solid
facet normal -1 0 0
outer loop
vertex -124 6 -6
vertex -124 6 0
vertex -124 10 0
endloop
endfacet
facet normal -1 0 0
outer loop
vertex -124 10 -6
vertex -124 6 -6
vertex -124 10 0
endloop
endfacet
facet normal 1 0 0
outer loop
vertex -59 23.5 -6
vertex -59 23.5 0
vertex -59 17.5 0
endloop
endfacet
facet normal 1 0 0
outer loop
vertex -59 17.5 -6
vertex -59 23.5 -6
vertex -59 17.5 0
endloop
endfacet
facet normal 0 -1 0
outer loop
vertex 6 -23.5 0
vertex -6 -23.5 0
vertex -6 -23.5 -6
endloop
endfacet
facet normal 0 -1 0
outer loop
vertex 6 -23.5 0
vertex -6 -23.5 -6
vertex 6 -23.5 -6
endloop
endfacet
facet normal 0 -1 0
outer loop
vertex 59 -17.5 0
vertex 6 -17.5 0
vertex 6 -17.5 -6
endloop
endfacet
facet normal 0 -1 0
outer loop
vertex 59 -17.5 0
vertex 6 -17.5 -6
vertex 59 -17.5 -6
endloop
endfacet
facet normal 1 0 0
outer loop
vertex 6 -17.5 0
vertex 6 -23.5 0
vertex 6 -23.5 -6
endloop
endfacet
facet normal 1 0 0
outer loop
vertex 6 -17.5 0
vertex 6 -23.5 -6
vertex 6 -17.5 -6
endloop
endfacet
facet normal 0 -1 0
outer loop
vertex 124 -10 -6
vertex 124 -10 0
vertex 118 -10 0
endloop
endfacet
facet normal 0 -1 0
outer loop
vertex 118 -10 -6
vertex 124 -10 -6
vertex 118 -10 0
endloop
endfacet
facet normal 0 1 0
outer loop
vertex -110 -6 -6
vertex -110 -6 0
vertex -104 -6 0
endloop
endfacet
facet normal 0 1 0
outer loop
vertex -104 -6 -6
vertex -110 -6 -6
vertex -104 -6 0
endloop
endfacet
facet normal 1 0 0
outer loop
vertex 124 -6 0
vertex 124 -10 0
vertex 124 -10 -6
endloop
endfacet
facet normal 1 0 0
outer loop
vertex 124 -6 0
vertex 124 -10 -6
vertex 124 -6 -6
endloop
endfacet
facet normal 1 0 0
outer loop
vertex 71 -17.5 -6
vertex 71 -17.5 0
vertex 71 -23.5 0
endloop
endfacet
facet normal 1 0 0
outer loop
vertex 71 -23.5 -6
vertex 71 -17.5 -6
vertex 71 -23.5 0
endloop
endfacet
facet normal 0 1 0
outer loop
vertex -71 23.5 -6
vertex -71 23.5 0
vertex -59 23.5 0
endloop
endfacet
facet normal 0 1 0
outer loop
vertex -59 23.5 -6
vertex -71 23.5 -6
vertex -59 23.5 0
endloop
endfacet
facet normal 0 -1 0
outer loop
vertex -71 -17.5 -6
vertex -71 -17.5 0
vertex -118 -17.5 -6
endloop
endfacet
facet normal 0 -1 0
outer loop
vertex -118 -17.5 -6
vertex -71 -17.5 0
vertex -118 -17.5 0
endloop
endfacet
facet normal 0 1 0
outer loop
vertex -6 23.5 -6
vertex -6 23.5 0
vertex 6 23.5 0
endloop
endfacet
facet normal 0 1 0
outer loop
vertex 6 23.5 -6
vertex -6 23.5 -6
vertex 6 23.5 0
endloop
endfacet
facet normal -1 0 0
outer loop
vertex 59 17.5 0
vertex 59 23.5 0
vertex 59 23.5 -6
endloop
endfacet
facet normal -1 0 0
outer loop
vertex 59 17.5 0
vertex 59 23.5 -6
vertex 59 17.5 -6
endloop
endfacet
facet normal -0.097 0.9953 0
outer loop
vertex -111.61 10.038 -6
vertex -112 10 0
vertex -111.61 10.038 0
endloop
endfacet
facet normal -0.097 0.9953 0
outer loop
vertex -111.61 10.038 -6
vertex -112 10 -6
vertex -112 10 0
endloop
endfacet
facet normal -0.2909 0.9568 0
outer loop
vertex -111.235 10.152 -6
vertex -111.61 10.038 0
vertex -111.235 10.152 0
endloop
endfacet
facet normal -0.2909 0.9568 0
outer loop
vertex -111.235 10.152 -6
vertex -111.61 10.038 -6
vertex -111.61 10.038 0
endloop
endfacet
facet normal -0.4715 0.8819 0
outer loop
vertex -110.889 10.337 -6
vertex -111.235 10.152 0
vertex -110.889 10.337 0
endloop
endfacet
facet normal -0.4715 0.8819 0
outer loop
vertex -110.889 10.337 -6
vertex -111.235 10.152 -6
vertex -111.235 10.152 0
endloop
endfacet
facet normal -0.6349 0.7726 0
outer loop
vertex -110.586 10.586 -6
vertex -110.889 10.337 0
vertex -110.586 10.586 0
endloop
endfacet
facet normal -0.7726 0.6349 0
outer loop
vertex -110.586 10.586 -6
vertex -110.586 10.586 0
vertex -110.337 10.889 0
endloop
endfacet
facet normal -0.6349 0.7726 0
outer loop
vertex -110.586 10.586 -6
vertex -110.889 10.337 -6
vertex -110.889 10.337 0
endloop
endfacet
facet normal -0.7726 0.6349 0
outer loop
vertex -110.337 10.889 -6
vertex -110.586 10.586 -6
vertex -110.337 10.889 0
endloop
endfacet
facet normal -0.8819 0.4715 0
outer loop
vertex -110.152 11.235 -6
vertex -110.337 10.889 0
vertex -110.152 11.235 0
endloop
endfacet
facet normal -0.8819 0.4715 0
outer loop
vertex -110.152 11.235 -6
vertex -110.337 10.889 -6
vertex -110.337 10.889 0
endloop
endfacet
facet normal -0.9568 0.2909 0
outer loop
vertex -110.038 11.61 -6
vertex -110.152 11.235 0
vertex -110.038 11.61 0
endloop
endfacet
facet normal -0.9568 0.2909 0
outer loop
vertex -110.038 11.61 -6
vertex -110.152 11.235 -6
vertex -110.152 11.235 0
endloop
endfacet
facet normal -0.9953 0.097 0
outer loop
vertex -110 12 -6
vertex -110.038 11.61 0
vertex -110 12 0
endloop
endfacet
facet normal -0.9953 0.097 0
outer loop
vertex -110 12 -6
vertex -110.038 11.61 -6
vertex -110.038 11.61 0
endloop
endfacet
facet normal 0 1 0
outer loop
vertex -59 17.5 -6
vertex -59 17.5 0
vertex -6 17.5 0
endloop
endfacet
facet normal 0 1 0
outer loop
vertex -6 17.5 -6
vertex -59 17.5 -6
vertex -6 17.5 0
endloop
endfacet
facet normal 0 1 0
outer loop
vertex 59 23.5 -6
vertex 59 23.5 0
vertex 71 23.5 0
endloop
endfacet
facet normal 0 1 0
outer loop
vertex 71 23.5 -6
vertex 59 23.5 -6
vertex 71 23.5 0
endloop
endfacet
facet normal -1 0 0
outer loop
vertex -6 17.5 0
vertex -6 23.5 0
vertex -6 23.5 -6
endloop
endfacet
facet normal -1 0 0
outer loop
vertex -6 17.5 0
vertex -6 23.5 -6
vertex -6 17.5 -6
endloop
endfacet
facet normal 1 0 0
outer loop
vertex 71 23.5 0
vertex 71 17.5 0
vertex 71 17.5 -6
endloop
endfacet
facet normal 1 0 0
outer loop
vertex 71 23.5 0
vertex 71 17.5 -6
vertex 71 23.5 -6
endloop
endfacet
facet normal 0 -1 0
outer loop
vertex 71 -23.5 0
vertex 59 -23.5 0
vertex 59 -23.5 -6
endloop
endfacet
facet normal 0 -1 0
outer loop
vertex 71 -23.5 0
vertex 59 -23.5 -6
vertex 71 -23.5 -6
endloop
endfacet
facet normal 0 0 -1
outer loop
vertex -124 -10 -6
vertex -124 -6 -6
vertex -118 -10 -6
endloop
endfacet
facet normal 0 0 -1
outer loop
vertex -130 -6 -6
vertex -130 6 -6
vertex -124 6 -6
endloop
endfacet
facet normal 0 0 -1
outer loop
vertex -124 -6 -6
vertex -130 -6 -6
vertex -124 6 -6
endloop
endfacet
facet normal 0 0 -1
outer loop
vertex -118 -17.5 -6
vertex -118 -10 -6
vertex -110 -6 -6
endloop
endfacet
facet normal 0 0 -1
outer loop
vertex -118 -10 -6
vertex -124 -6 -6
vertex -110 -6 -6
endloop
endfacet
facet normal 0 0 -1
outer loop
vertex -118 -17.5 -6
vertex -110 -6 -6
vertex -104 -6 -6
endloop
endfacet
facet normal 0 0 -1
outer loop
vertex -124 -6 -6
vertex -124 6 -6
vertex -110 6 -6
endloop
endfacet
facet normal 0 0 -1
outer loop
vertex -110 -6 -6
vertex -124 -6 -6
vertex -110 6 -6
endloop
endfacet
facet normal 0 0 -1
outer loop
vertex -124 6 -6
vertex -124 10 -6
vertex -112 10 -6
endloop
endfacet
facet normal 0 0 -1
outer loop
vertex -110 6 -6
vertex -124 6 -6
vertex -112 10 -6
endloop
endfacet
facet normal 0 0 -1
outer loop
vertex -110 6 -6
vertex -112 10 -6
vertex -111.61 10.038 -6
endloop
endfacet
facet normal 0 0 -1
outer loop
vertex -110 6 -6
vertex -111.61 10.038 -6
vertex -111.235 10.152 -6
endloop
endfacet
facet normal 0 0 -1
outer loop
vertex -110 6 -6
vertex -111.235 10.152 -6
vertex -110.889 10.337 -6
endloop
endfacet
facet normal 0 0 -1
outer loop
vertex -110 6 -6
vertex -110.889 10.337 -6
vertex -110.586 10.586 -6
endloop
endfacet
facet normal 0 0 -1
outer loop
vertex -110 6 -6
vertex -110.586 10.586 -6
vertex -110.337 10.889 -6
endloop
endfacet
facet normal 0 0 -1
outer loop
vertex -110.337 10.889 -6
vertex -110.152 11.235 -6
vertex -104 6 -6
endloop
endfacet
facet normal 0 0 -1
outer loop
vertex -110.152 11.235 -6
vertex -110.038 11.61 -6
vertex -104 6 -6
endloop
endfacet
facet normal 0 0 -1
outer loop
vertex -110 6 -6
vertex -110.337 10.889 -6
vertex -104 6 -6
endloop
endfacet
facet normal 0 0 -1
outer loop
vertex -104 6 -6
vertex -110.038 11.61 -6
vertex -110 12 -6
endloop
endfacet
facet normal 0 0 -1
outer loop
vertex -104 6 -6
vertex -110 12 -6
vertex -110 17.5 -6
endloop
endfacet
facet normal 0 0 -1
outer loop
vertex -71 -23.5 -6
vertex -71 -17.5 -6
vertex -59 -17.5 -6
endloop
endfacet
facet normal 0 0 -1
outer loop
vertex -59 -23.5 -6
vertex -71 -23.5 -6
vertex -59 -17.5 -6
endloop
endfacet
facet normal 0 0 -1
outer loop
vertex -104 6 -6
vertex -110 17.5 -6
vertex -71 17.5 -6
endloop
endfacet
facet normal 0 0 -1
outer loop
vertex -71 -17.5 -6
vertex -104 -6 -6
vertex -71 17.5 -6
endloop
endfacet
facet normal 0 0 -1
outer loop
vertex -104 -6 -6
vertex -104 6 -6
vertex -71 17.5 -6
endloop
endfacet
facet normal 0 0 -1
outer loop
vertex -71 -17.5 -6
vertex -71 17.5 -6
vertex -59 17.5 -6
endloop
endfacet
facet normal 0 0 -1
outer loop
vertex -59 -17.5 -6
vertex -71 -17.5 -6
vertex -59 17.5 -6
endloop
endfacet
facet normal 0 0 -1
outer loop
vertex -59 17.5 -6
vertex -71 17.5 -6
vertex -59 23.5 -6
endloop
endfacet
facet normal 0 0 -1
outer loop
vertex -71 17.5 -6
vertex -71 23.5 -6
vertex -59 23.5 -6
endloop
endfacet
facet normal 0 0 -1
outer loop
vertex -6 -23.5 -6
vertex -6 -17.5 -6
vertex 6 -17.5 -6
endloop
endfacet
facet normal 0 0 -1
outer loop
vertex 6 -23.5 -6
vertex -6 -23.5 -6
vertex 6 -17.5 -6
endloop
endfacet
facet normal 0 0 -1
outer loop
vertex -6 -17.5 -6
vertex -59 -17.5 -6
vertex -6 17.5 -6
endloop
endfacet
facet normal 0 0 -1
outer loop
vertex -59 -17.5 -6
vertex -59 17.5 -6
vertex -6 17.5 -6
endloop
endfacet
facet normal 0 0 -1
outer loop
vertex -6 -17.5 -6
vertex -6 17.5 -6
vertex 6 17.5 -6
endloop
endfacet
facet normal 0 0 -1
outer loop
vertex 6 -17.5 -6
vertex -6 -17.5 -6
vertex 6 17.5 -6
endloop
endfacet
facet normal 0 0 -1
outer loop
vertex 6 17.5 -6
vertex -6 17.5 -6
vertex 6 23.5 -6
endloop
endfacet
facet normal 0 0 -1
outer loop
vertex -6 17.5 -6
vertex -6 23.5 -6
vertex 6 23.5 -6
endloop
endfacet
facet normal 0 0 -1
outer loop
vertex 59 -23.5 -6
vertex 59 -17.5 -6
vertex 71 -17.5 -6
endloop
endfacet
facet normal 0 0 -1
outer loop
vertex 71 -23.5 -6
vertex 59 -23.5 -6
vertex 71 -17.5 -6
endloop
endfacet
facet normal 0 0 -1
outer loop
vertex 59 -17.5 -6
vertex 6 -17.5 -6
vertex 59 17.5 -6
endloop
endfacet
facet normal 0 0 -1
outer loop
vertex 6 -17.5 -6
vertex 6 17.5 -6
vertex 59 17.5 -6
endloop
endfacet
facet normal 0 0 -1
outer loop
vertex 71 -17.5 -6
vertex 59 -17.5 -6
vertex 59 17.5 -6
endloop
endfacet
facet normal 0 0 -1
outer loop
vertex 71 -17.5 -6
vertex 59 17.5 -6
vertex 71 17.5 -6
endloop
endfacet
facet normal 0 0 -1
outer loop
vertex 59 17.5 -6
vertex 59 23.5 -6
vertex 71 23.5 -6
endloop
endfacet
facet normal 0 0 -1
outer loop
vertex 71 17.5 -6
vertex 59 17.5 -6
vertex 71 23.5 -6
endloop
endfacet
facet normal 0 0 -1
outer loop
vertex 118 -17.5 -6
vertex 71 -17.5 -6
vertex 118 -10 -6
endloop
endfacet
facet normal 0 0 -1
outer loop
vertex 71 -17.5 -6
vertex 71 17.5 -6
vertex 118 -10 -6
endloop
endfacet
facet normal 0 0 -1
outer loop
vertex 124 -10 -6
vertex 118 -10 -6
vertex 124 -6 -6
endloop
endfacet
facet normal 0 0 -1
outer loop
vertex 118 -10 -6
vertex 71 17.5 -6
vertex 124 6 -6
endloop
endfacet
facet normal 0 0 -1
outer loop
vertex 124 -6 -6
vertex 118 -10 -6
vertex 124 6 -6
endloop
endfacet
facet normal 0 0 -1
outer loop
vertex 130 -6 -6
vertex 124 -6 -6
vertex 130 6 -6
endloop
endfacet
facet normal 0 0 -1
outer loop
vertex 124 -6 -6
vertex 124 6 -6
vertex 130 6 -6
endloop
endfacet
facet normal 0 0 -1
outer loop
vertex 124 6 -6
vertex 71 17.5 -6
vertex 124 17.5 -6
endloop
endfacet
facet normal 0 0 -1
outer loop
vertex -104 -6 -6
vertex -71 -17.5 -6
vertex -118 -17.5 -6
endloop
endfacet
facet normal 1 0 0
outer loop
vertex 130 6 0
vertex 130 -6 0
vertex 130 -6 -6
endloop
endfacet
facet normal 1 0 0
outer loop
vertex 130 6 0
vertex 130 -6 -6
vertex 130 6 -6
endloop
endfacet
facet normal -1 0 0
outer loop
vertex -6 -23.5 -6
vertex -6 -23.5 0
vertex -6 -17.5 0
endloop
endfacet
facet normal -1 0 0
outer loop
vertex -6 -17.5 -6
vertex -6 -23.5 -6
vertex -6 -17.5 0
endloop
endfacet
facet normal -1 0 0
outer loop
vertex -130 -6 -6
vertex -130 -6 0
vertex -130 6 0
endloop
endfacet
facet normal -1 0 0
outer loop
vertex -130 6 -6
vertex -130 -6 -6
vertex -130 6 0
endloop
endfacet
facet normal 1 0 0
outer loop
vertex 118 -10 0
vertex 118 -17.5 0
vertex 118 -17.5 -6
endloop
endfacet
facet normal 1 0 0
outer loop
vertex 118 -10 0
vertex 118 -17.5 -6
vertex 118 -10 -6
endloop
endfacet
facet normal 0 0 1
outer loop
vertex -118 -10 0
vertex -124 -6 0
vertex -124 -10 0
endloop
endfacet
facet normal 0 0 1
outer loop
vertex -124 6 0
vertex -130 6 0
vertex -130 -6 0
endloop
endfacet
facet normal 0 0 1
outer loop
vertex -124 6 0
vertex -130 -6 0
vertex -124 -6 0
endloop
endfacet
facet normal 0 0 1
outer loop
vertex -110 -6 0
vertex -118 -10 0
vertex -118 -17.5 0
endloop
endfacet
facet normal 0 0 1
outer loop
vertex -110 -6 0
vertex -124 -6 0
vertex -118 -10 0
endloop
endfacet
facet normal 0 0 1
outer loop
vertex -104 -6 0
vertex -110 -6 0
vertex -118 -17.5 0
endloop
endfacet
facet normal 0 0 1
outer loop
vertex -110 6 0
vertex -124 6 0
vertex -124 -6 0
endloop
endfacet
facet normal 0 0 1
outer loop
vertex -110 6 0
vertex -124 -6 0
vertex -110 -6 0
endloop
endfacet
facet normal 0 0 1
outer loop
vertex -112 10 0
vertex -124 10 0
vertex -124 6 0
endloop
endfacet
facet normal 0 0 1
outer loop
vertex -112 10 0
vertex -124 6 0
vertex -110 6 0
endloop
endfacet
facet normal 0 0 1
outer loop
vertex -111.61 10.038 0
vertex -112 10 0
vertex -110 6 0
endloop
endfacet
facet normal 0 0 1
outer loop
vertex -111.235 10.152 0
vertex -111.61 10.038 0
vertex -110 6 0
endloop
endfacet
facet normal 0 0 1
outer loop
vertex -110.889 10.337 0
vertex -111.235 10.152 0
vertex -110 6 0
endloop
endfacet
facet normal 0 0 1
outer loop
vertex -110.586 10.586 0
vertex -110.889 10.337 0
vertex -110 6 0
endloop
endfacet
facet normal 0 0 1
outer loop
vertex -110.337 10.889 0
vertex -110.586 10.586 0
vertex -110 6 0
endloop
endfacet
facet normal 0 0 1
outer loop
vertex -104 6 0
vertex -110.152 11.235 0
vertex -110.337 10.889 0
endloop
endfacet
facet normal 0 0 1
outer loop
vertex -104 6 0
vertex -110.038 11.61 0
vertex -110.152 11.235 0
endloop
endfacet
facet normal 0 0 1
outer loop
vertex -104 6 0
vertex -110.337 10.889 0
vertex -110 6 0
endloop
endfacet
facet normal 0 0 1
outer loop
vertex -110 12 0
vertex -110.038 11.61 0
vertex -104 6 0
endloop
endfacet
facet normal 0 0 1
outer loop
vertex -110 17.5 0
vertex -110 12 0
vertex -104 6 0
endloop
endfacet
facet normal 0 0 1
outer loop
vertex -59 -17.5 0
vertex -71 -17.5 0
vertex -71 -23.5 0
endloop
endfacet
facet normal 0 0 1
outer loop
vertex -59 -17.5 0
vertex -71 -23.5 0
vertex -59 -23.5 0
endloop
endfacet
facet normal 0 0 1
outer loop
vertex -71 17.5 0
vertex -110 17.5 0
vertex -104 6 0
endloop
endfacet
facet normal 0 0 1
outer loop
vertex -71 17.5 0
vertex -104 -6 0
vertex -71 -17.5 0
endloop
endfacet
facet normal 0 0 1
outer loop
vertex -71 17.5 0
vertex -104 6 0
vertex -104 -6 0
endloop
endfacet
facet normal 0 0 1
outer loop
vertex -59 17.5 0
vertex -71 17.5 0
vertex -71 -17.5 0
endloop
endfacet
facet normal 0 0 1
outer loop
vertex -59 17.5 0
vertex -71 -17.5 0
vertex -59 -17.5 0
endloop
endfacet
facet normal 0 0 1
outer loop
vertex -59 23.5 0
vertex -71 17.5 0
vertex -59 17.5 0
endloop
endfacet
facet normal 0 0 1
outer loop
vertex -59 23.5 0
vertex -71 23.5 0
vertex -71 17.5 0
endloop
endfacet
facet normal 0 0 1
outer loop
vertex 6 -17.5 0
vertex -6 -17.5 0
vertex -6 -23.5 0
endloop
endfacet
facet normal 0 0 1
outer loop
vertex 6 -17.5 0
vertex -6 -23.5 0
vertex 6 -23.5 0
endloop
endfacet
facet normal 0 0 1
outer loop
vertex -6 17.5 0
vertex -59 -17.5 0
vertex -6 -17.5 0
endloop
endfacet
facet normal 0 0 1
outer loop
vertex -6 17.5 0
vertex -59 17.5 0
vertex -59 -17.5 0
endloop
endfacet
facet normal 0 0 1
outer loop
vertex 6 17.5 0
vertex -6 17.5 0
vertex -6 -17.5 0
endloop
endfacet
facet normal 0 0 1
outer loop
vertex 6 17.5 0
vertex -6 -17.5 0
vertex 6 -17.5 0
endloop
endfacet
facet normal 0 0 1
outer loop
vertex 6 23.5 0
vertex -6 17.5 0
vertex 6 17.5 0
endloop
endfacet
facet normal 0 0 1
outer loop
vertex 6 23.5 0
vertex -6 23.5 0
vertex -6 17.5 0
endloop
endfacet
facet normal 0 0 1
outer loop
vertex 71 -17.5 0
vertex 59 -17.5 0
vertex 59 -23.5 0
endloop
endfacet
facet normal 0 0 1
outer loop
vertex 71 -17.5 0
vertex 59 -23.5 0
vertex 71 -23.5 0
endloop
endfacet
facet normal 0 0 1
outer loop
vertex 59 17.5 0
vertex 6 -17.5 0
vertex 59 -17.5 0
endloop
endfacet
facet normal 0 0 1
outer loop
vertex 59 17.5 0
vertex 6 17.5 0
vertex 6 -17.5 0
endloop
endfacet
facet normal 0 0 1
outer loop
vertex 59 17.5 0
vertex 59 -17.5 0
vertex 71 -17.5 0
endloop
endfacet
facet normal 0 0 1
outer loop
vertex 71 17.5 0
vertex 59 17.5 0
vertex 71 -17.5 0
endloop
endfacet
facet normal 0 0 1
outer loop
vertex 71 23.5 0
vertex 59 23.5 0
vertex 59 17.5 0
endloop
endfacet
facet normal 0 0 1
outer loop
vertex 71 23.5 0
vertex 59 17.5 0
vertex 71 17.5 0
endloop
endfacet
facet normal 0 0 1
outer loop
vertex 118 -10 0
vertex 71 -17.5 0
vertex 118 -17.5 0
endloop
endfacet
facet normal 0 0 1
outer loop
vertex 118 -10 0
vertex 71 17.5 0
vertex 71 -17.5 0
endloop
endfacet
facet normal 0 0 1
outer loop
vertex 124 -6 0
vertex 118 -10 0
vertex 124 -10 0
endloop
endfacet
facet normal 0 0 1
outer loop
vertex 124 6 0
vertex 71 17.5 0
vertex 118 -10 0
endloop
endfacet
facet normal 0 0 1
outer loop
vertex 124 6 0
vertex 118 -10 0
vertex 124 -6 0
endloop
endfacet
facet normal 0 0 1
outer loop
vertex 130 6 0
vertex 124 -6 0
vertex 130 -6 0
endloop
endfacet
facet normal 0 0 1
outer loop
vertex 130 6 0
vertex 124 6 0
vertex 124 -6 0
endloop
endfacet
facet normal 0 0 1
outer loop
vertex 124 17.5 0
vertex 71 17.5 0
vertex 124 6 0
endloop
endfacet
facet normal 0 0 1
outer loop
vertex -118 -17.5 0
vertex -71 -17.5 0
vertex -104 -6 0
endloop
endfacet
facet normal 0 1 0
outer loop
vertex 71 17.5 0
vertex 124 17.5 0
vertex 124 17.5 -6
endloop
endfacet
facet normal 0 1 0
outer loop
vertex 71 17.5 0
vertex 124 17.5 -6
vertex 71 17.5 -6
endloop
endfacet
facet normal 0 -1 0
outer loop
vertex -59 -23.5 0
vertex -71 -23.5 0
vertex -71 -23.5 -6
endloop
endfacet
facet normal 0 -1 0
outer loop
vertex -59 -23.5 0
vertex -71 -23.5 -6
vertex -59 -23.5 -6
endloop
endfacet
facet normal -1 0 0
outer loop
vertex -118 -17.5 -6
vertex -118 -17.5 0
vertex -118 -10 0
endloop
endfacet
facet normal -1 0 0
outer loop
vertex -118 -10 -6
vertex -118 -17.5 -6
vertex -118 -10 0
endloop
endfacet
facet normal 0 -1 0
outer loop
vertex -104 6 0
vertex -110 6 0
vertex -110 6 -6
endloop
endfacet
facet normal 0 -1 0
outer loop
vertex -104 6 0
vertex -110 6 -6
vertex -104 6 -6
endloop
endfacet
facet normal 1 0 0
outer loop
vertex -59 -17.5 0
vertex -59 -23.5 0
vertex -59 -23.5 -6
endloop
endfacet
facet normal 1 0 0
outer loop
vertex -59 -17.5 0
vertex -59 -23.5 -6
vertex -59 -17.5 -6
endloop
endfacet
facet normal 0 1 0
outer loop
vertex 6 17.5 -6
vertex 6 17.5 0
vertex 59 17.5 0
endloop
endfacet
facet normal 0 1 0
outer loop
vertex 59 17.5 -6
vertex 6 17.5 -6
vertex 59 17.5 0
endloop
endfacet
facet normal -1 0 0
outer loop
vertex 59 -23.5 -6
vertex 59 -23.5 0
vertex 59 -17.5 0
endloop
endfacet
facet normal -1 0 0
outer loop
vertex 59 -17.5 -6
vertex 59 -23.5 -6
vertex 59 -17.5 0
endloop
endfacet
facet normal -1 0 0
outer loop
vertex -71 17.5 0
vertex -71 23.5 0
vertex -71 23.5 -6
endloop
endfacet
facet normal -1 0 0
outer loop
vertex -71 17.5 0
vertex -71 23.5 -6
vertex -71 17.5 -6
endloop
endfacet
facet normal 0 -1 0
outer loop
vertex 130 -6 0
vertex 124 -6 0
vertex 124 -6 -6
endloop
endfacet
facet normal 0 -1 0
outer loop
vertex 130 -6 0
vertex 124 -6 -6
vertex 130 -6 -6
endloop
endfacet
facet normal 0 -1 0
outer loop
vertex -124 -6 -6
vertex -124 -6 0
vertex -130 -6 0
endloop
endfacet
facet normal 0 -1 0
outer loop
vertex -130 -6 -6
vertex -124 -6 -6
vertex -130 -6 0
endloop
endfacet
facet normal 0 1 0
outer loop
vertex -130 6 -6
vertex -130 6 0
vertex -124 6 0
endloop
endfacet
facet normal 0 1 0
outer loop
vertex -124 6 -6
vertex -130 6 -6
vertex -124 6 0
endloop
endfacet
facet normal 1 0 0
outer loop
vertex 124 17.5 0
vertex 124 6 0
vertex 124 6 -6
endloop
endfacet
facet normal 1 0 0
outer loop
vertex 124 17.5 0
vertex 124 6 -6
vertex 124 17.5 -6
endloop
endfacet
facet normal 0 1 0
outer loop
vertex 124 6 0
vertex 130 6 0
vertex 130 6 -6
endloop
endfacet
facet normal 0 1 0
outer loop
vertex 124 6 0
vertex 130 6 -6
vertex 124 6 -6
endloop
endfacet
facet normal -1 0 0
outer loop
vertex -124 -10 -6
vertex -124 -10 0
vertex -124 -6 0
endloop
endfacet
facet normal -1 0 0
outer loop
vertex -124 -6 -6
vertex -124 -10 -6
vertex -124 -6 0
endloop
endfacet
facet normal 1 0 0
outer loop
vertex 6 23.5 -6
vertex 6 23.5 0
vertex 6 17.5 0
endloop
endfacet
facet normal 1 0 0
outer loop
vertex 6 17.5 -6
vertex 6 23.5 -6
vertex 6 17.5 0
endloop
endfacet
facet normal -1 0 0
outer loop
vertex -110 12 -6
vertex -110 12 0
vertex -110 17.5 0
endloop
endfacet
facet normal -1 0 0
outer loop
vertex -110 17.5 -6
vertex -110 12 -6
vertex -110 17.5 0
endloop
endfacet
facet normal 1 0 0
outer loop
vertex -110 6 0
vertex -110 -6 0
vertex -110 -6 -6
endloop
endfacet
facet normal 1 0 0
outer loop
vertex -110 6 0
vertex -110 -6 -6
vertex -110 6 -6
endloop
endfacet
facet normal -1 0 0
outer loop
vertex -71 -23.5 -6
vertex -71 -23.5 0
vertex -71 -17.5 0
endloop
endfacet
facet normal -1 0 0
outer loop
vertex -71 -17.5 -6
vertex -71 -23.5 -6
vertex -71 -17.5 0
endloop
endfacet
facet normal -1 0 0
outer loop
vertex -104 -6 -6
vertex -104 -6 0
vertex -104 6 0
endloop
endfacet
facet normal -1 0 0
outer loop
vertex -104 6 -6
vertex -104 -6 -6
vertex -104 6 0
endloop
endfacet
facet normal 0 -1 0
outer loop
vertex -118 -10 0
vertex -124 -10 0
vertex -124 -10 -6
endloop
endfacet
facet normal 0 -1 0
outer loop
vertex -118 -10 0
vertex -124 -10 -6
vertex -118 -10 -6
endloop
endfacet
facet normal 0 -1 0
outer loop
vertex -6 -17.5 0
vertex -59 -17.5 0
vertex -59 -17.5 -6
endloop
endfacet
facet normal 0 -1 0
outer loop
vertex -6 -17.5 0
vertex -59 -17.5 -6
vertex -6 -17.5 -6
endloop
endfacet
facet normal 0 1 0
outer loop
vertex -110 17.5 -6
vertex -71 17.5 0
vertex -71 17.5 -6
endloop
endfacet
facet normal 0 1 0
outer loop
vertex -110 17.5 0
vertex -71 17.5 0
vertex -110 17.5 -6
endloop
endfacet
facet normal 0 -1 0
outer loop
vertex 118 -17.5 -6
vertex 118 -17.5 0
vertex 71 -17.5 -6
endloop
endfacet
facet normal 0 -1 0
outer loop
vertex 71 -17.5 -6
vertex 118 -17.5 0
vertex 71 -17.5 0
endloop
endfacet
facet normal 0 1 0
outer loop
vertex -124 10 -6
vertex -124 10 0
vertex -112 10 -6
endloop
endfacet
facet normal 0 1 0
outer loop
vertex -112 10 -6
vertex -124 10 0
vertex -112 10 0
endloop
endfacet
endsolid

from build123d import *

# Parameters (mm, degrees)
SKETCH1_W           = 260
SKETCH1_H           = 47
BOSS_EXTRUDE1_DEPTH = 6
SKETCH3_W           = 6
SKETCH3_H           = 17.5
SKETCH3_H_2         = 7.5
CUT_EXTRUDE1_DEPTH  = 7
SKETCH4_W           = 53
SKETCH4_H           = 6
CUT_EXTRUDE2_DEPTH  = 7
SKETCH5_W           = 14
SKETCH5_H           = 7.5
SKETCH5_W_2         = 6
SKETCH5_H_2         = 12
CUT_EXTRUDE3_DEPTH  = 7
FILLET1_R           = 2


with BuildPart() as part:
    # Sketch1 → Boss-Extrude1 (new body)
    with BuildSketch(Plane.XY):
        Rectangle(SKETCH1_W, SKETCH1_H)
    extrude(amount=-BOSS_EXTRUDE1_DEPTH)

    # Sketch3 → Cut-Extrude1 (cut, through all)
    with BuildSketch(Plane.XY):
        with Locations((-127, 14.75)):
            Rectangle(SKETCH3_W, SKETCH3_H)
        Polygon((-124, -6), (-130, -6), (-130, -23.5), (-124, -23.5), (-124, -17.5), (-124, -10), align=None)
        with Locations((-121, -13.75)):
            Rectangle(SKETCH3_W, SKETCH3_H_2)
    cut_extrude1 = extrude(amount=-CUT_EXTRUDE1_DEPTH, mode=Mode.SUBTRACT)

    # Mirror1: Cut-Extrude1 across plane
    add(cut_extrude1.mirror(Plane(origin=(0, 0, 0), x_dir=(0, 0, 1), z_dir=(1, 0, 0))), mode=Mode.SUBTRACT)

    # Sketch4 → Cut-Extrude2 (cut, through all)
    with BuildSketch(Plane.XY):
        Polygon((-118, -17.5), (-124, -17.5), (-124, -23.5), (-71, -23.5), (-71, -17.5), align=None)
        with Locations((-32.5, -20.5)):
            Rectangle(SKETCH4_W, SKETCH4_H)
        with Locations((32.5, -20.5)):
            Rectangle(SKETCH4_W, SKETCH4_H)
        Polygon((71, -17.5), (71, -23.5), (124, -23.5), (124, -17.5), (118, -17.5), align=None)
    cut_extrude2 = extrude(amount=-CUT_EXTRUDE2_DEPTH, mode=Mode.SUBTRACT)

    # Mirror2: Cut-Extrude2 across plane
    add(cut_extrude2.mirror(Plane.ZX), mode=Mode.SUBTRACT)

    # Sketch5 → Cut-Extrude3 (cut, through all)
    with BuildSketch(Plane.XY):
        with Locations((-117, 13.75)):
            Rectangle(SKETCH5_W, SKETCH5_H)
        with Locations((-107, 0)):
            Rectangle(SKETCH5_W_2, SKETCH5_H_2)
    extrude(amount=-CUT_EXTRUDE3_DEPTH, mode=Mode.SUBTRACT)

    # Fillet1
    fillet1_edges = [part.edges().sort_by_distance(p)[0] for p in [
        (-110, 10, -3),
    ]]
    fillet(fillet1_edges, radius=FILLET1_R)


solid = part.part
